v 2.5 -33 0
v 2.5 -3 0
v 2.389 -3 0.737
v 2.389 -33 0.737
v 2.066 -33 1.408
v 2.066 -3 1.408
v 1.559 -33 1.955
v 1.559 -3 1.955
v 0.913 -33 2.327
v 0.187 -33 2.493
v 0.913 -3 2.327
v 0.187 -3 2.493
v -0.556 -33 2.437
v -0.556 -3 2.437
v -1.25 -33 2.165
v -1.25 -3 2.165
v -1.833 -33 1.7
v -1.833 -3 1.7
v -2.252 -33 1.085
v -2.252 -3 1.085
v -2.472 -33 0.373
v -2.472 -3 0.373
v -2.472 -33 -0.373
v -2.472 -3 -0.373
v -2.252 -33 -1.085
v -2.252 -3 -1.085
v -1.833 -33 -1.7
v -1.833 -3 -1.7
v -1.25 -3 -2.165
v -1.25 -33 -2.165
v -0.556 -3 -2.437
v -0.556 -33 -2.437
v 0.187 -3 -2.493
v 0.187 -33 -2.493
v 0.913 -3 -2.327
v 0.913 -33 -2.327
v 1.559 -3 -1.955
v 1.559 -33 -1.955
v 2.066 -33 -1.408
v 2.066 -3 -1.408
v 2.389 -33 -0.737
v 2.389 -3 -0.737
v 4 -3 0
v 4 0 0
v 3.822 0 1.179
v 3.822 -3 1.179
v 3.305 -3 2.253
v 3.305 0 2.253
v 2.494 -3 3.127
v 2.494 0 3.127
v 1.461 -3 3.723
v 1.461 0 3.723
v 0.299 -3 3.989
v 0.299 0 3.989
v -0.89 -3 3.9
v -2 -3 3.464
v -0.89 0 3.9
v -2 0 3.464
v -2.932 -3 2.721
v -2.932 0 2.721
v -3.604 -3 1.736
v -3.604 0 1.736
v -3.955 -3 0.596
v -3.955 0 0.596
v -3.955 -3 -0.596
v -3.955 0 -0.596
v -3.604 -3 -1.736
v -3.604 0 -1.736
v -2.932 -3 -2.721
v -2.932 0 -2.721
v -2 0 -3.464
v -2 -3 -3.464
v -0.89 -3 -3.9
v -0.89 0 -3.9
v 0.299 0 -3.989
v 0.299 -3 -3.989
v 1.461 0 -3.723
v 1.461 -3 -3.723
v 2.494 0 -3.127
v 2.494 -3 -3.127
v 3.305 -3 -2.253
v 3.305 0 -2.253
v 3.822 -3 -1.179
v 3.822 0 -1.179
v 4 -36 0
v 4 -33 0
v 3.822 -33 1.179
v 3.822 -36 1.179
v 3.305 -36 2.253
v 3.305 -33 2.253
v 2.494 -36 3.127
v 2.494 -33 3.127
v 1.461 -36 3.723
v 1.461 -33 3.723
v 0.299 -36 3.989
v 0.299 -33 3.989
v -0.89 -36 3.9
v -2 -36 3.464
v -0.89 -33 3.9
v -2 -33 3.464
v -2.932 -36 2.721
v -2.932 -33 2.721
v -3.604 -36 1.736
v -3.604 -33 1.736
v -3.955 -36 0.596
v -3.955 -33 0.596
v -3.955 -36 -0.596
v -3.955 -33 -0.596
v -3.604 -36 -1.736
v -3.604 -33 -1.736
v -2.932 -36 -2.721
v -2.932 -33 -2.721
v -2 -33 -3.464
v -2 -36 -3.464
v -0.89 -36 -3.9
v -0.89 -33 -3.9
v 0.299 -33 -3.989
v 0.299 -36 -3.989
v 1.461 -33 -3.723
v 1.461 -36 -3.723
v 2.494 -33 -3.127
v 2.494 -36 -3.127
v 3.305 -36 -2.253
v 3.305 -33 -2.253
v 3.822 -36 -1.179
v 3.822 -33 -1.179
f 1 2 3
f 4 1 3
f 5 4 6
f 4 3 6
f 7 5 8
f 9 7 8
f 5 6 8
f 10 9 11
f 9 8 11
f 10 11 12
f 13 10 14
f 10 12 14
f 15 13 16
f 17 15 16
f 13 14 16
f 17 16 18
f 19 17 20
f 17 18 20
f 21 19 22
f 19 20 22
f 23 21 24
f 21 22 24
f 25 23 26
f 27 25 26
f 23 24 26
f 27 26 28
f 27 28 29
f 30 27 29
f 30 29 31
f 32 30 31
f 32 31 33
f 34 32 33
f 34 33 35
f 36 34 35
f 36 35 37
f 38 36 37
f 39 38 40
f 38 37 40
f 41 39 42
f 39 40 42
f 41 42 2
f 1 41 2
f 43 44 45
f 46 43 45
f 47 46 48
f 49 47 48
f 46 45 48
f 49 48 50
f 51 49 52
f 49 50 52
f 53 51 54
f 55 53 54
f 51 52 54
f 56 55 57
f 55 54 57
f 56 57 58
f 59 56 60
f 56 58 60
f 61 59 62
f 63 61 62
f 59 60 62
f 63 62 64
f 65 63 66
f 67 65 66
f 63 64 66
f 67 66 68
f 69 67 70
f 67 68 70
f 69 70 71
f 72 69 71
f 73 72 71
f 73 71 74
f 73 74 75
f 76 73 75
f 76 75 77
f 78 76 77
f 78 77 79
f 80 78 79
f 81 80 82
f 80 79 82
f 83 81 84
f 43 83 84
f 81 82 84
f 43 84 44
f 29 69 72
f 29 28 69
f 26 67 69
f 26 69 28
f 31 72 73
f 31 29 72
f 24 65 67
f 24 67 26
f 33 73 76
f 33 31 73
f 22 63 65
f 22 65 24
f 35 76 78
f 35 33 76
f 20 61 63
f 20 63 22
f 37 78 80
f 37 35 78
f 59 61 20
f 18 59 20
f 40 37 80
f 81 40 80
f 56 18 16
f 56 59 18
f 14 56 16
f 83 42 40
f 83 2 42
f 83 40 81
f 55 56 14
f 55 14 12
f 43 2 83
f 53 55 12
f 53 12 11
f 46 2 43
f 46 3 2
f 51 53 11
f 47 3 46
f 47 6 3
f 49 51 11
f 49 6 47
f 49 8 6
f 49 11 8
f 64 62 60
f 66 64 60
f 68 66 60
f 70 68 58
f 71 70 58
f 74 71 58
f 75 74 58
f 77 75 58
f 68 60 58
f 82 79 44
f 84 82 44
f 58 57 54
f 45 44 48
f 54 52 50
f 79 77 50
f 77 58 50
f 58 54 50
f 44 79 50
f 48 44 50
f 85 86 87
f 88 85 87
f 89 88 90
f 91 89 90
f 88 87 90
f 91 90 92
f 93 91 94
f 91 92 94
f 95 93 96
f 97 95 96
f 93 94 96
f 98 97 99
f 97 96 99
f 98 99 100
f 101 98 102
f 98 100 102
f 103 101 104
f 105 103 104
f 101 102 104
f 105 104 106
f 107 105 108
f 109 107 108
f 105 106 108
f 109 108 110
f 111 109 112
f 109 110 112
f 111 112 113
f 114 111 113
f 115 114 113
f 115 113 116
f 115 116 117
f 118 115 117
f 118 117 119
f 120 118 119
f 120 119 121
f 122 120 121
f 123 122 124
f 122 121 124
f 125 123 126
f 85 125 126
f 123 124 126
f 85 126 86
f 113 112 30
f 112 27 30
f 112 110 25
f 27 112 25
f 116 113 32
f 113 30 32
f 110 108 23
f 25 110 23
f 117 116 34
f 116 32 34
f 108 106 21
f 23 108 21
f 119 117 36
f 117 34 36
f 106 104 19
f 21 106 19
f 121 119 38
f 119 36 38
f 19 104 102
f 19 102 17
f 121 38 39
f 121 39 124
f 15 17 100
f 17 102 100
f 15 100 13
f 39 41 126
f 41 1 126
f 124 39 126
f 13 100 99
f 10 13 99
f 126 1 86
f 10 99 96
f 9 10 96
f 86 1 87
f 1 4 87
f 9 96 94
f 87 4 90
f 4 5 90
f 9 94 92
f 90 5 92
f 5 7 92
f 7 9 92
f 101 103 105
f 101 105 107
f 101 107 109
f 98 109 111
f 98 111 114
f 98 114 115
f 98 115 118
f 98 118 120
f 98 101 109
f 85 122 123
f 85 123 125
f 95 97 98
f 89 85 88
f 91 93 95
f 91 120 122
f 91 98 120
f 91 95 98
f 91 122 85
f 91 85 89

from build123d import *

# Parameters (mm, degrees)
F0_R     = 4
F1_DEPTH = 3
F2_R     = 2.5
F3_DEPTH = 30
F4_R     = 4
F4_R_2   = 2.5
F5_DEPTH = 3


with BuildPart() as f1:
    # F0 (on Front) → F1 (new body)
    with BuildSketch(Plane.XZ):
        Circle(F0_R)
    extrude(amount=F1_DEPTH)

    # F2 (on face) → F3 (join)
    with BuildSketch(Plane.XZ.offset(3)):
        Circle(F2_R)
    extrude(amount=F3_DEPTH)

    # F4 (on face) → F5 (join)
    with BuildSketch(Plane.XZ.offset(33)):
        Circle(F4_R)
        Circle(F4_R_2, mode=Mode.SUBTRACT)
        Circle(F4_R_2)
    extrude(amount=F5_DEPTH)


solid = f1.part
